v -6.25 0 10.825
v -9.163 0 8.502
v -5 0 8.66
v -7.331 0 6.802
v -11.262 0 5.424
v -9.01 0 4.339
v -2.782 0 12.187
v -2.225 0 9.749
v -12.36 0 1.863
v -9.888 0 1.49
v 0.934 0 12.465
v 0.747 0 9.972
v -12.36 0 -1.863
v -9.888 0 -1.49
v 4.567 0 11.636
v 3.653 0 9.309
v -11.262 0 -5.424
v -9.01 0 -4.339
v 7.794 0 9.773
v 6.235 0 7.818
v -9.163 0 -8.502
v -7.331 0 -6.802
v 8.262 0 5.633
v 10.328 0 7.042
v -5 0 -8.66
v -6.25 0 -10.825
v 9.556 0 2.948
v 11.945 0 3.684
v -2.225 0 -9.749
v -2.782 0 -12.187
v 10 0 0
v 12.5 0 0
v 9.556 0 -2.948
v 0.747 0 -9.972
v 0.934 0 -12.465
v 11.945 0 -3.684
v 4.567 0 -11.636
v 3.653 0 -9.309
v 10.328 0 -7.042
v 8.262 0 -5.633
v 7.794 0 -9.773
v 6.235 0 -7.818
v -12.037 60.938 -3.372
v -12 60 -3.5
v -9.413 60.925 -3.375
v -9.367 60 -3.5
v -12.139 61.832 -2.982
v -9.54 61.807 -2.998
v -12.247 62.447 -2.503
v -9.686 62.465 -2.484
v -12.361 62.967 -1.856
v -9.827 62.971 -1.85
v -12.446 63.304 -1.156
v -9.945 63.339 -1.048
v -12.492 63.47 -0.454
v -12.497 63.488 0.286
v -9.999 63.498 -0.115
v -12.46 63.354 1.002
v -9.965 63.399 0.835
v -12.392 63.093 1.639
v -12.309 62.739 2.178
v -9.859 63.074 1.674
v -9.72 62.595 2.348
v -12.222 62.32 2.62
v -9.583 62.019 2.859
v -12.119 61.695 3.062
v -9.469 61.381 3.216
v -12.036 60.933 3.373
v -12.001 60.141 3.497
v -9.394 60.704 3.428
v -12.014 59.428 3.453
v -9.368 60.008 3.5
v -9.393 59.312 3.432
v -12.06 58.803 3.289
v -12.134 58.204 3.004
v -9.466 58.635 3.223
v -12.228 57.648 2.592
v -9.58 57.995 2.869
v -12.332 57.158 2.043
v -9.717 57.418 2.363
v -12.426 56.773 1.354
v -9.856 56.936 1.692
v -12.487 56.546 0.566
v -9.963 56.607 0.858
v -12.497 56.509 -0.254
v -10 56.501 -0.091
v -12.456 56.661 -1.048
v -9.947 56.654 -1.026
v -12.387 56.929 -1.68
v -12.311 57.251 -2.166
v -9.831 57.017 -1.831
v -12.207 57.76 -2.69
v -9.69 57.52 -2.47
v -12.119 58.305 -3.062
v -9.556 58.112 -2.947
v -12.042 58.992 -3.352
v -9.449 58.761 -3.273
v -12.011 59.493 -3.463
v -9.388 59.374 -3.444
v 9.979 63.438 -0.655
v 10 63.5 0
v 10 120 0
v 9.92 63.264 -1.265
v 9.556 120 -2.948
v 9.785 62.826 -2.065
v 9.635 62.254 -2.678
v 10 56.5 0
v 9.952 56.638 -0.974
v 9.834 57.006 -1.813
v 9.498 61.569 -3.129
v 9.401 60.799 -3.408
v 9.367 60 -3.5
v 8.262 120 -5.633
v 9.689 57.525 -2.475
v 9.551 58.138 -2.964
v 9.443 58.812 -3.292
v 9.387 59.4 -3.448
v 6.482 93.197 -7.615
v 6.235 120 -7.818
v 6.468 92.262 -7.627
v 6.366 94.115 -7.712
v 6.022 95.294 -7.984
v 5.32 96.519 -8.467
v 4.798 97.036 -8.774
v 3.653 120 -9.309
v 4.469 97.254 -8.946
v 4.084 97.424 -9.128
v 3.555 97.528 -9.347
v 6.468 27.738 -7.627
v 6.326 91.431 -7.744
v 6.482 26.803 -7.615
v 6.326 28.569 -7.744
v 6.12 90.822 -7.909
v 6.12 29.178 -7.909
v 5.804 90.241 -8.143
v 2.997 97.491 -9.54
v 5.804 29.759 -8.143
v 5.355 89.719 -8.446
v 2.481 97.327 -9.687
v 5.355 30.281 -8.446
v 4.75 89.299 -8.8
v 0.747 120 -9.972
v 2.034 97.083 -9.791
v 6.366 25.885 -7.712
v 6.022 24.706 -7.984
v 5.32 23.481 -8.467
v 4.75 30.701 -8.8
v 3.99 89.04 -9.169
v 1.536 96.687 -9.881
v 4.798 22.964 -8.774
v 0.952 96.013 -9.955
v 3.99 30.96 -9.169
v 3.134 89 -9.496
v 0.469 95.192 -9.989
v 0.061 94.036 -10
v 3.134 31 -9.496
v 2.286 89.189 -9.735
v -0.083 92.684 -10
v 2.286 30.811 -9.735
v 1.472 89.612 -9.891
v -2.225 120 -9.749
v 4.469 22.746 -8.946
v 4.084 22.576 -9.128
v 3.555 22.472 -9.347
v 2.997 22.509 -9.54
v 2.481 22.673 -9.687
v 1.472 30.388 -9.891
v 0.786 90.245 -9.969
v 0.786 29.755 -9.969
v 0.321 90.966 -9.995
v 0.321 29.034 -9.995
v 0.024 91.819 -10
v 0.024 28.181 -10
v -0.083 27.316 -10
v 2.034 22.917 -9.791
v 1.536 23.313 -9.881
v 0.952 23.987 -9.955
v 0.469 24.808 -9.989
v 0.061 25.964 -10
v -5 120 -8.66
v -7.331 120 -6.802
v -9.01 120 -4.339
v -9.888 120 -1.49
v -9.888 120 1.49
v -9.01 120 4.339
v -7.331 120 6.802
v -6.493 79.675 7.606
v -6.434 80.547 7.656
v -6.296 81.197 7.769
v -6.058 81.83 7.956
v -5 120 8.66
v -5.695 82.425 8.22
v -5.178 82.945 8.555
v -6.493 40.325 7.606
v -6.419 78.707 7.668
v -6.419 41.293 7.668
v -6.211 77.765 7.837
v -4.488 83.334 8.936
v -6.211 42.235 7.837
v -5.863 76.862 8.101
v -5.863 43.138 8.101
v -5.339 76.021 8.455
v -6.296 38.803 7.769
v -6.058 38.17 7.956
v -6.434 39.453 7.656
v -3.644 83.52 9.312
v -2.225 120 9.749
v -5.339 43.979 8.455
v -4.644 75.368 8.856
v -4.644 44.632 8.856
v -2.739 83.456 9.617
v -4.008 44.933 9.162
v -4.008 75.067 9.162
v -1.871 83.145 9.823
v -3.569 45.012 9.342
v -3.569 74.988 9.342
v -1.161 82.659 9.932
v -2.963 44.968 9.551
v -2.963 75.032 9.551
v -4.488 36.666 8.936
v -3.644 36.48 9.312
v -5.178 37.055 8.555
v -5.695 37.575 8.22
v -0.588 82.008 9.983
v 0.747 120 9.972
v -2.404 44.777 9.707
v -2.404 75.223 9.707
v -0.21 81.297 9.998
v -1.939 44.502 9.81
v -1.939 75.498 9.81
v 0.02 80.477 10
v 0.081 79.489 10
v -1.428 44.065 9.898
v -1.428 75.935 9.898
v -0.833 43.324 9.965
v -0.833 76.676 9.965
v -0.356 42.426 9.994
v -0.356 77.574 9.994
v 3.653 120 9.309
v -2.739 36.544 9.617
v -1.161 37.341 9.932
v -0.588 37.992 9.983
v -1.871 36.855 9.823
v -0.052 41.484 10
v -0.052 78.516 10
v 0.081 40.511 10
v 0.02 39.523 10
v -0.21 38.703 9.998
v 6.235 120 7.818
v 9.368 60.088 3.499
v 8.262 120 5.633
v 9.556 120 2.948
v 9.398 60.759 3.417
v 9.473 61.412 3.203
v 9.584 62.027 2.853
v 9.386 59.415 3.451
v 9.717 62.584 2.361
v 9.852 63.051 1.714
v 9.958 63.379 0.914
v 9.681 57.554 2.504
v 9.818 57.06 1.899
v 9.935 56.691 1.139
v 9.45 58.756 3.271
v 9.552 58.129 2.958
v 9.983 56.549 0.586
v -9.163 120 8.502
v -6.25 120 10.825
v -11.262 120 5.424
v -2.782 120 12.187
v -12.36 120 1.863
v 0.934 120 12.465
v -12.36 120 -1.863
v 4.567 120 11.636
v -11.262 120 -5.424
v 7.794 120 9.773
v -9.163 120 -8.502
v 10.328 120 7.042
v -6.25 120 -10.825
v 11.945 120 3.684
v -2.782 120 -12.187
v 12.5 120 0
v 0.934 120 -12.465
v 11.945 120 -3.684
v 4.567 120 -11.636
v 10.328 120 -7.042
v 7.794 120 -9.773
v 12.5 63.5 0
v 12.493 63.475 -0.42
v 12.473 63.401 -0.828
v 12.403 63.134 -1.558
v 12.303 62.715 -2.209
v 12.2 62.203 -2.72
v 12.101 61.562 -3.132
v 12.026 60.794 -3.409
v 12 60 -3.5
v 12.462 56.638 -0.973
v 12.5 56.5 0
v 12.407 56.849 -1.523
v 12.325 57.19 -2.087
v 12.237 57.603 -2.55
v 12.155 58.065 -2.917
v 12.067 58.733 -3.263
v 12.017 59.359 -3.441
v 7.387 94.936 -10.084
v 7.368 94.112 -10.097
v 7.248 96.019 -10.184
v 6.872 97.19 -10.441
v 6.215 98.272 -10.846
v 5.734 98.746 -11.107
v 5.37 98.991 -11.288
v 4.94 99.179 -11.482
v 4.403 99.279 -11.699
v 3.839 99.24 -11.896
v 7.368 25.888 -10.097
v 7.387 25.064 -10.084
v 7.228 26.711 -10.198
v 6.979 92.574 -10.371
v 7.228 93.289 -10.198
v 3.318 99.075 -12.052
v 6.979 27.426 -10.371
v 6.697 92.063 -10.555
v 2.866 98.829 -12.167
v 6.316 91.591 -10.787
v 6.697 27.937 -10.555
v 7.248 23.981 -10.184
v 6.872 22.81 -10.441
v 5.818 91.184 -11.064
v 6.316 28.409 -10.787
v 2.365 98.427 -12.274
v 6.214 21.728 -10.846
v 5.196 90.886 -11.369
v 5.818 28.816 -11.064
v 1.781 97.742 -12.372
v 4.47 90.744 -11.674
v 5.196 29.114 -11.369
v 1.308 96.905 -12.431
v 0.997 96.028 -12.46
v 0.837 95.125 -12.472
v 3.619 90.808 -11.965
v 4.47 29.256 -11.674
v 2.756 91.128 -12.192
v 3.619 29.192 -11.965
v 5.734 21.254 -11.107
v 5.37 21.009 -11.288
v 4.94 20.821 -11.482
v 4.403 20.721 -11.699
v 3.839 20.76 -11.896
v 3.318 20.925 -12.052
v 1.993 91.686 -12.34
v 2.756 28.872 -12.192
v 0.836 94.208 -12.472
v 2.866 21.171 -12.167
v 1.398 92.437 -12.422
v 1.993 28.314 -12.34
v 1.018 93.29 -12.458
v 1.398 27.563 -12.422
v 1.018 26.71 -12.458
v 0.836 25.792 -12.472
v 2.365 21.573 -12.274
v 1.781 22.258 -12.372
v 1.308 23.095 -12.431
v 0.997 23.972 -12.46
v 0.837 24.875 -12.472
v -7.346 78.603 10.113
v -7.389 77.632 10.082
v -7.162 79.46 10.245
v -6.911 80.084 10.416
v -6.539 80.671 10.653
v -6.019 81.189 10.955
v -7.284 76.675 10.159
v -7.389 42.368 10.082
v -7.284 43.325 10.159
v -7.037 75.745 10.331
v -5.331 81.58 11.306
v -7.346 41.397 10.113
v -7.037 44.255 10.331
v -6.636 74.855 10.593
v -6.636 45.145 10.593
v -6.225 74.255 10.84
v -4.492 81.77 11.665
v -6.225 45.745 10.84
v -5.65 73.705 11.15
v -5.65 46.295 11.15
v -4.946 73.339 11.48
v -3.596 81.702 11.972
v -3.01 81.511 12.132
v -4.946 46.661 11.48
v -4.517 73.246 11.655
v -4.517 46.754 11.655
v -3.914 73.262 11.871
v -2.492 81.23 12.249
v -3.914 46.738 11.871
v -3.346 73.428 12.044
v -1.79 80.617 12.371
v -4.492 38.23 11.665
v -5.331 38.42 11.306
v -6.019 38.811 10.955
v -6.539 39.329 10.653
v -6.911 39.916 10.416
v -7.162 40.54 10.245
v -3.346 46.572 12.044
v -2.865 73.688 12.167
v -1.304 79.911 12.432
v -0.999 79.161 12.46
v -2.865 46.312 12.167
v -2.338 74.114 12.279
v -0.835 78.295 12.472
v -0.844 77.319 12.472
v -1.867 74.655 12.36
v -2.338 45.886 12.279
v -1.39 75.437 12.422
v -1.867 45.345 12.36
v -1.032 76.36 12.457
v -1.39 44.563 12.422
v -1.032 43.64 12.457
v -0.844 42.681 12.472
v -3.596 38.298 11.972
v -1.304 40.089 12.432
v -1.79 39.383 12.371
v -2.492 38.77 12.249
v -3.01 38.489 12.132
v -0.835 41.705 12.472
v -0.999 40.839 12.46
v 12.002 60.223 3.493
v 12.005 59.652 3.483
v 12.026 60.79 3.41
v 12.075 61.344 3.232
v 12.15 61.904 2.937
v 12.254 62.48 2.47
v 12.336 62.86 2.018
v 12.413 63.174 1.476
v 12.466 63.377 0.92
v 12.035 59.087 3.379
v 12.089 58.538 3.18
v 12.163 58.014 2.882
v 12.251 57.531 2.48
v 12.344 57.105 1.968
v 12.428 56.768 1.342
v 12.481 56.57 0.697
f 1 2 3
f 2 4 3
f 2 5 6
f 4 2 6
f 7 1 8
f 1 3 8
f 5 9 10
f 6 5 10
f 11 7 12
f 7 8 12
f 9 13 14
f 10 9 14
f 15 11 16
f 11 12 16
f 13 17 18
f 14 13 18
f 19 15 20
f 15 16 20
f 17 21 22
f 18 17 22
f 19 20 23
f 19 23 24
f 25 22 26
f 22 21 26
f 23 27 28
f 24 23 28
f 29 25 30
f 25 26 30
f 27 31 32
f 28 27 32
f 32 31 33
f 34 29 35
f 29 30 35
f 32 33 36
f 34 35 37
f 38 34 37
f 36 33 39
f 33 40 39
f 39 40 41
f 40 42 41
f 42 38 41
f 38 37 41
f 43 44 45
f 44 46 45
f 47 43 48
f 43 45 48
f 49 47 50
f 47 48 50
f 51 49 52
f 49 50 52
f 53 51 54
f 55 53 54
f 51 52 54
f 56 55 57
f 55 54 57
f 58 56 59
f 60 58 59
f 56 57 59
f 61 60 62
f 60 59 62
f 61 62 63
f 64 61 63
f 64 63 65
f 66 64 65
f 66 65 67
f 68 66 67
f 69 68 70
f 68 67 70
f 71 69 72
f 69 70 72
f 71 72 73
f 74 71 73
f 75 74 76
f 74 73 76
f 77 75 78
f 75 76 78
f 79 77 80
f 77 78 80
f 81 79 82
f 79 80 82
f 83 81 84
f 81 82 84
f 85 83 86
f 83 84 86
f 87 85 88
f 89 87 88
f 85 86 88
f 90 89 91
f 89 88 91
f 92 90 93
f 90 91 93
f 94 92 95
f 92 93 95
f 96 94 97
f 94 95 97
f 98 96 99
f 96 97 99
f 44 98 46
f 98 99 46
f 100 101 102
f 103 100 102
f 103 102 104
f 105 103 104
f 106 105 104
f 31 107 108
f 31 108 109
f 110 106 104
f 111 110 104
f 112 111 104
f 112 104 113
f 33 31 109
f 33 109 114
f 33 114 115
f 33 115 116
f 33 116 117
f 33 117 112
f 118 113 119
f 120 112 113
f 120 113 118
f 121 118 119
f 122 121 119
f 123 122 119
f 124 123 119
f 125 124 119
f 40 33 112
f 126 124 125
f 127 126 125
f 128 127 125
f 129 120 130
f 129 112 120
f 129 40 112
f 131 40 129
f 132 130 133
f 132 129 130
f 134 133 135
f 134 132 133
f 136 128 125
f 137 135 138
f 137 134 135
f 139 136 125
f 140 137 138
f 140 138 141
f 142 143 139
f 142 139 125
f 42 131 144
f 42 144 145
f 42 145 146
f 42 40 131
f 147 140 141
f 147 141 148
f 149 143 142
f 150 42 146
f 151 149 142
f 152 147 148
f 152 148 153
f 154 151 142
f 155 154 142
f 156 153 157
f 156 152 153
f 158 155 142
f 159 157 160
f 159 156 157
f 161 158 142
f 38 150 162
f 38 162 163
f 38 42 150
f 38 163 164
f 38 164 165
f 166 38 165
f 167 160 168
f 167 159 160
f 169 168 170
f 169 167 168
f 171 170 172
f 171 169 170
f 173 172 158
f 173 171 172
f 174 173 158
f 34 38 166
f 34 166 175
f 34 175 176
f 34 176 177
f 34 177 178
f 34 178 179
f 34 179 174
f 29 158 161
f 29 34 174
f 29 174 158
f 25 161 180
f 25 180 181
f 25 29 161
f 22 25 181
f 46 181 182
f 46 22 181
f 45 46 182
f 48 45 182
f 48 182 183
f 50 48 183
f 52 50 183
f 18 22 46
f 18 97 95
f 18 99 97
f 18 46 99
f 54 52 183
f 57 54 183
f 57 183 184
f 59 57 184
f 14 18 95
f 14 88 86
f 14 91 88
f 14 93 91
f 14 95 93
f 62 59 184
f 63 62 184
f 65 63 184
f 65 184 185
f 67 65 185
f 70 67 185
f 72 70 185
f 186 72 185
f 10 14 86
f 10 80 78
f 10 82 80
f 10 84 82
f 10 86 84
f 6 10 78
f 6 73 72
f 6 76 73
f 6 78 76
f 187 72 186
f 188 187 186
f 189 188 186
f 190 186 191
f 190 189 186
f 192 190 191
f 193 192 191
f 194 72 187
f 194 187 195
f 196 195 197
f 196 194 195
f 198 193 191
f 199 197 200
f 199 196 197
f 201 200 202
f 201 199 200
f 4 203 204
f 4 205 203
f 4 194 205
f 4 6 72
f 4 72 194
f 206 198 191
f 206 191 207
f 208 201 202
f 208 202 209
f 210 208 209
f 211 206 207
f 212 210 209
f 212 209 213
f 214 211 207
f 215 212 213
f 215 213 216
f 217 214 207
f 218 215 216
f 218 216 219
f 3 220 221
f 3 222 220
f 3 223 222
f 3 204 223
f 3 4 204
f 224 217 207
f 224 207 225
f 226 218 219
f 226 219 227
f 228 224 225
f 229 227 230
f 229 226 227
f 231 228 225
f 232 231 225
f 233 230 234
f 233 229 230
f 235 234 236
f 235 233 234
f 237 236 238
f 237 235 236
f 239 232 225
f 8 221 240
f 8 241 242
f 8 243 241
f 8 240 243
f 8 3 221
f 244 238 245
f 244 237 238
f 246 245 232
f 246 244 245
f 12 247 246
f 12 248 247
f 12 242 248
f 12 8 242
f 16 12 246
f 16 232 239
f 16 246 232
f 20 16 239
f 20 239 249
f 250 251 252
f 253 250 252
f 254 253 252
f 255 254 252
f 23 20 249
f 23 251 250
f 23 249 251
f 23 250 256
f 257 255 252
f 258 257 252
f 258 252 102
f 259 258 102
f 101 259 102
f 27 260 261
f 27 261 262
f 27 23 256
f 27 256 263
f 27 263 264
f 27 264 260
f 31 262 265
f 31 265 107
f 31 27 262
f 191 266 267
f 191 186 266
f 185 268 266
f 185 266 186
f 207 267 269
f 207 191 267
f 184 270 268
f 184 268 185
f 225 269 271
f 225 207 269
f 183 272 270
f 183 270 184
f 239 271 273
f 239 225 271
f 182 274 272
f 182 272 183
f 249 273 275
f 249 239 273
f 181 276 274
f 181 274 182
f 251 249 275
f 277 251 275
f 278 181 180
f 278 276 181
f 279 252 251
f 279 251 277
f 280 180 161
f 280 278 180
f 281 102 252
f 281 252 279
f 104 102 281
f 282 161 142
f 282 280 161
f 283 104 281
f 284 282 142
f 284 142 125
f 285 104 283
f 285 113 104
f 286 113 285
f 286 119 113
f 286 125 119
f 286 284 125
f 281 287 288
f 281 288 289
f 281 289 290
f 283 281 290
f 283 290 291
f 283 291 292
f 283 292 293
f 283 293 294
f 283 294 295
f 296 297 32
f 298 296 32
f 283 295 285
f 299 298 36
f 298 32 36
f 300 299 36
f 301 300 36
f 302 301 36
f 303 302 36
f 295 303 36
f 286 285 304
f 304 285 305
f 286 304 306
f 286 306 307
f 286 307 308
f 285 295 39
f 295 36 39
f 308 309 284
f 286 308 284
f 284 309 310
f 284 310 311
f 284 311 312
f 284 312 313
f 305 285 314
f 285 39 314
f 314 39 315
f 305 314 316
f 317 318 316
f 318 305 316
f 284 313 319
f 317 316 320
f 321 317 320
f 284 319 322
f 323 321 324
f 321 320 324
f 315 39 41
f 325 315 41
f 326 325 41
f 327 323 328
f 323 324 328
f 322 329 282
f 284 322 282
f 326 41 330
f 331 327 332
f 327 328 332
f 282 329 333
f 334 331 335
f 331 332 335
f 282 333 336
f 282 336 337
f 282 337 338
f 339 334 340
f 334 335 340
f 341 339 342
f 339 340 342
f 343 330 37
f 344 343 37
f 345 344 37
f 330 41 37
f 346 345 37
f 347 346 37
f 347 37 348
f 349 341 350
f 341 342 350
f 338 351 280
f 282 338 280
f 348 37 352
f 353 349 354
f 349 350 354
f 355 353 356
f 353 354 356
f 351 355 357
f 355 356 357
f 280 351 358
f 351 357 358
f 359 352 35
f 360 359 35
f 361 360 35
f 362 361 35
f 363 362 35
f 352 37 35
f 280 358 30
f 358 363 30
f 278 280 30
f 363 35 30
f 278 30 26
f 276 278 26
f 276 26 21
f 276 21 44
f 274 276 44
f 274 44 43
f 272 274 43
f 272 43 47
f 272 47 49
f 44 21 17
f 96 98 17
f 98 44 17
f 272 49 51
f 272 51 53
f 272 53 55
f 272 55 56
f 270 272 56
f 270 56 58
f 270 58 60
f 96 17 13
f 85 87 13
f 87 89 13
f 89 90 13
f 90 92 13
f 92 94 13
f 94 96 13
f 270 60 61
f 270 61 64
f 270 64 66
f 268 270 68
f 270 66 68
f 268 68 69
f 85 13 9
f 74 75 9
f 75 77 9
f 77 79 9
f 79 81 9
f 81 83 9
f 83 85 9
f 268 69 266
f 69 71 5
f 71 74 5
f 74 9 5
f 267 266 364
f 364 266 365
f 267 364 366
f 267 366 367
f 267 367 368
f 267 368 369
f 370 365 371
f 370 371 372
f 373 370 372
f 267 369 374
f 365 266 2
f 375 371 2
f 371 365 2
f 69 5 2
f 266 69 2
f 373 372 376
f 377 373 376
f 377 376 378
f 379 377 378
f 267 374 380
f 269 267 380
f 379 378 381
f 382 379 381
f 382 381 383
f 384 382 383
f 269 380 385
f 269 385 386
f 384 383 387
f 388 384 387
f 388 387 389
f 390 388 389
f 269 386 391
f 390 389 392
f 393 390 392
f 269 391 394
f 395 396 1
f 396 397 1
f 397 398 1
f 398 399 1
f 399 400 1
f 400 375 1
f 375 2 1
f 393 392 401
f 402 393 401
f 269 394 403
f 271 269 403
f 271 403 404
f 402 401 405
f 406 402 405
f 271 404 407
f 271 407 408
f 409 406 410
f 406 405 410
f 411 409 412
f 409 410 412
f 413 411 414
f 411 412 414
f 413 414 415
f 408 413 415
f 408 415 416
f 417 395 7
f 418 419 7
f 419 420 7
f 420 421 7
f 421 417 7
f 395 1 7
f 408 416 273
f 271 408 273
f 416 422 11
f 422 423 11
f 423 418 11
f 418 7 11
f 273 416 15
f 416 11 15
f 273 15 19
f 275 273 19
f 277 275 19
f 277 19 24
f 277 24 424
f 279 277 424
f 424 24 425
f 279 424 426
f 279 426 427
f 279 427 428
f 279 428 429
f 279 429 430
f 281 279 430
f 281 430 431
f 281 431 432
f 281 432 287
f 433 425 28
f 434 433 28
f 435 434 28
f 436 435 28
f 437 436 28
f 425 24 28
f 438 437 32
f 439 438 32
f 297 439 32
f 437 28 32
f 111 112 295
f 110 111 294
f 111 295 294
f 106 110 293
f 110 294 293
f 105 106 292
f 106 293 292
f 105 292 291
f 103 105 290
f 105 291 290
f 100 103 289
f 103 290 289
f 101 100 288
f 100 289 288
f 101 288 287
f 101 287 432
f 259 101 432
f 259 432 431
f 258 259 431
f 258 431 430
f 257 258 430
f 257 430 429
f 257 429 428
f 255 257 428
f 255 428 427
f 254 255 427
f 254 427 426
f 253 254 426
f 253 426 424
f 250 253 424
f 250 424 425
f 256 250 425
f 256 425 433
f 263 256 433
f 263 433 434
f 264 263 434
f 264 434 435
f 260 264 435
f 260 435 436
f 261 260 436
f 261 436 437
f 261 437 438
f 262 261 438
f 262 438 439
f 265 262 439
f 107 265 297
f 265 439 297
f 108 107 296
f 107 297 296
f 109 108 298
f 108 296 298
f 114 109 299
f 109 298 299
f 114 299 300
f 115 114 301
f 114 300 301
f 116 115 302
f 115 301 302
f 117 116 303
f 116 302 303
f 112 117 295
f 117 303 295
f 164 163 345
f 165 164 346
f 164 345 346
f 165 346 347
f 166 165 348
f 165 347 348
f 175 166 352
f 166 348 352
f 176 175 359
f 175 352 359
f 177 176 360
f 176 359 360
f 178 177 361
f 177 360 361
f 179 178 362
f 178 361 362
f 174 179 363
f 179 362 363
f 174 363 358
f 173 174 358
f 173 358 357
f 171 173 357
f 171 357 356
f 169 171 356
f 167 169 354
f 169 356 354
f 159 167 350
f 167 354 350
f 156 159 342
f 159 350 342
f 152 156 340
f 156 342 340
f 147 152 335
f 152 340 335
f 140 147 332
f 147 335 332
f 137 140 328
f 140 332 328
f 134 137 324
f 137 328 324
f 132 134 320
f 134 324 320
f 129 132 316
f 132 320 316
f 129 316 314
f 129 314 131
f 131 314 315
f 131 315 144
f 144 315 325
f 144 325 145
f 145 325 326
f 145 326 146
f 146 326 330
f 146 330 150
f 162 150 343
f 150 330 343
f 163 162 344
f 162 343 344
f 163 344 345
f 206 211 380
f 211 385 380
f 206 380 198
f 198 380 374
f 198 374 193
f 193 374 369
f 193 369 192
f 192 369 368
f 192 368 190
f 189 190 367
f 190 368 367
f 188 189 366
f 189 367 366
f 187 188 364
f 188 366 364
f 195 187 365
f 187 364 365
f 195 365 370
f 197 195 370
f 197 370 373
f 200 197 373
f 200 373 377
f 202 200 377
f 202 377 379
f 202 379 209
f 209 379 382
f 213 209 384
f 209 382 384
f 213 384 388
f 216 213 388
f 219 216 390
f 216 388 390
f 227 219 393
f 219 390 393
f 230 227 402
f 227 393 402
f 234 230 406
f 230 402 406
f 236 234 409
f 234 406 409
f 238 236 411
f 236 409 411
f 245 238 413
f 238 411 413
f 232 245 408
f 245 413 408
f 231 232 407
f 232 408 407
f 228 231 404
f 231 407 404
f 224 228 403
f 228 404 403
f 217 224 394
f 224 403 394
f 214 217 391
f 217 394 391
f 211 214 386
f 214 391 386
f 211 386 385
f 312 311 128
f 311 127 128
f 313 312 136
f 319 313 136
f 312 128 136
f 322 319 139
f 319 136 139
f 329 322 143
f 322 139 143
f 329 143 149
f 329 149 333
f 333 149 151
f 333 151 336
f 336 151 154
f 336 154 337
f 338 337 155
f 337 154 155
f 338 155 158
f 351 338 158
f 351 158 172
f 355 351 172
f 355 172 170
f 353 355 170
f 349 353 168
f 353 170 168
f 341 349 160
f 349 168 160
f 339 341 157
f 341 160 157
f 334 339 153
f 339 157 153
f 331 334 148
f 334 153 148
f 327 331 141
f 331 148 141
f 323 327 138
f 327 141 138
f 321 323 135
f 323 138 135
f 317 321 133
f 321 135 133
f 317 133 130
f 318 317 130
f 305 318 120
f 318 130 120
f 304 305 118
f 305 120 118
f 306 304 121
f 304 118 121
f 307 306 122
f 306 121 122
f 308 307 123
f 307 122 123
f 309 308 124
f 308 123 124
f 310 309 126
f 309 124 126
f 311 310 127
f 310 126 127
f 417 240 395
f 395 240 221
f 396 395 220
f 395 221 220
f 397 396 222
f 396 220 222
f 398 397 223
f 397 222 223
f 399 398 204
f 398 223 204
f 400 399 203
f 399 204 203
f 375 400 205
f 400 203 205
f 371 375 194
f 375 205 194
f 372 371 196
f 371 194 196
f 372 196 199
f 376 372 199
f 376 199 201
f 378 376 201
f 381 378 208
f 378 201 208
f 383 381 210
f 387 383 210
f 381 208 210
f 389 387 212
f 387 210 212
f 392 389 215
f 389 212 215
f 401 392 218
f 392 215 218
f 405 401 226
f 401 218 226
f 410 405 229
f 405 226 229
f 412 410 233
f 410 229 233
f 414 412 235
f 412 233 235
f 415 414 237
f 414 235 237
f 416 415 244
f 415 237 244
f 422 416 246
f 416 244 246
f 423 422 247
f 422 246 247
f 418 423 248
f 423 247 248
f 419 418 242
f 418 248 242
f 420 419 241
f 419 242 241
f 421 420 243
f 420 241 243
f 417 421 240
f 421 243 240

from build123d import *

# Parameters (mm, degrees)
SKETCH_1_R          = 12.5
SKETCH_1_R_2        = 10
EXTRUDE_1_DEPTH     = 120
SKETCH_2_R          = 3.5
CUT_EXTRUDE_1_DEPTH = 12.5
SWEEP_3_PROFILE_R   = 3.5


with BuildPart() as part:
    # 草图1 → 凸台-拉伸1 (new body)
    with BuildSketch(Plane(origin=(0, 0, 0), x_dir=(1, 0, 0), z_dir=(0, 1, 0))):
        Circle(SKETCH_1_R)
        Circle(SKETCH_1_R_2, mode=Mode.SUBTRACT)
    extrude(amount=EXTRUDE_1_DEPTH)

    # 草图2 → 切除-拉伸1 (cut, symmetric)
    with BuildSketch(Plane(origin=(0, 0, 0), x_dir=(0, 0, -1), z_dir=(1, 0, 0))):
        with Locations((0, 60)):
            Circle(SKETCH_2_R)
    extrude(amount=CUT_EXTRUDE_1_DEPTH, both=True, mode=Mode.SUBTRACT)

    # 切除-扫描3: sweep along a path in 草图10
    with BuildLine(Plane(origin=(0, 0, 0), x_dir=(0.342020143, 0, -0.939692621), z_dir=(0.939692621, 0, 0.342020143))) as sweep_3_path:
        Line((42.494333557, 116.01263537), (-37.5, 60))
        Line((-37.5, 60), (79.181849156, -21.701510351))
    # 切除-扫描3 profile (on start of the path) → 切除-扫描3 (sweep, cut)
    with BuildSketch(Plane(origin=(14.533918054, 116.01263537, -39.931611668), x_dir=(0, 0.801864671, 0.59750569), z_dir=(-0.2801665, -0.573576436, 0.769751131))):
        Circle(SWEEP_3_PROFILE_R)
    sweep(path=sweep_3_path.line, transition=Transition.RIGHT, mode=Mode.SUBTRACT)


solid = part.part
